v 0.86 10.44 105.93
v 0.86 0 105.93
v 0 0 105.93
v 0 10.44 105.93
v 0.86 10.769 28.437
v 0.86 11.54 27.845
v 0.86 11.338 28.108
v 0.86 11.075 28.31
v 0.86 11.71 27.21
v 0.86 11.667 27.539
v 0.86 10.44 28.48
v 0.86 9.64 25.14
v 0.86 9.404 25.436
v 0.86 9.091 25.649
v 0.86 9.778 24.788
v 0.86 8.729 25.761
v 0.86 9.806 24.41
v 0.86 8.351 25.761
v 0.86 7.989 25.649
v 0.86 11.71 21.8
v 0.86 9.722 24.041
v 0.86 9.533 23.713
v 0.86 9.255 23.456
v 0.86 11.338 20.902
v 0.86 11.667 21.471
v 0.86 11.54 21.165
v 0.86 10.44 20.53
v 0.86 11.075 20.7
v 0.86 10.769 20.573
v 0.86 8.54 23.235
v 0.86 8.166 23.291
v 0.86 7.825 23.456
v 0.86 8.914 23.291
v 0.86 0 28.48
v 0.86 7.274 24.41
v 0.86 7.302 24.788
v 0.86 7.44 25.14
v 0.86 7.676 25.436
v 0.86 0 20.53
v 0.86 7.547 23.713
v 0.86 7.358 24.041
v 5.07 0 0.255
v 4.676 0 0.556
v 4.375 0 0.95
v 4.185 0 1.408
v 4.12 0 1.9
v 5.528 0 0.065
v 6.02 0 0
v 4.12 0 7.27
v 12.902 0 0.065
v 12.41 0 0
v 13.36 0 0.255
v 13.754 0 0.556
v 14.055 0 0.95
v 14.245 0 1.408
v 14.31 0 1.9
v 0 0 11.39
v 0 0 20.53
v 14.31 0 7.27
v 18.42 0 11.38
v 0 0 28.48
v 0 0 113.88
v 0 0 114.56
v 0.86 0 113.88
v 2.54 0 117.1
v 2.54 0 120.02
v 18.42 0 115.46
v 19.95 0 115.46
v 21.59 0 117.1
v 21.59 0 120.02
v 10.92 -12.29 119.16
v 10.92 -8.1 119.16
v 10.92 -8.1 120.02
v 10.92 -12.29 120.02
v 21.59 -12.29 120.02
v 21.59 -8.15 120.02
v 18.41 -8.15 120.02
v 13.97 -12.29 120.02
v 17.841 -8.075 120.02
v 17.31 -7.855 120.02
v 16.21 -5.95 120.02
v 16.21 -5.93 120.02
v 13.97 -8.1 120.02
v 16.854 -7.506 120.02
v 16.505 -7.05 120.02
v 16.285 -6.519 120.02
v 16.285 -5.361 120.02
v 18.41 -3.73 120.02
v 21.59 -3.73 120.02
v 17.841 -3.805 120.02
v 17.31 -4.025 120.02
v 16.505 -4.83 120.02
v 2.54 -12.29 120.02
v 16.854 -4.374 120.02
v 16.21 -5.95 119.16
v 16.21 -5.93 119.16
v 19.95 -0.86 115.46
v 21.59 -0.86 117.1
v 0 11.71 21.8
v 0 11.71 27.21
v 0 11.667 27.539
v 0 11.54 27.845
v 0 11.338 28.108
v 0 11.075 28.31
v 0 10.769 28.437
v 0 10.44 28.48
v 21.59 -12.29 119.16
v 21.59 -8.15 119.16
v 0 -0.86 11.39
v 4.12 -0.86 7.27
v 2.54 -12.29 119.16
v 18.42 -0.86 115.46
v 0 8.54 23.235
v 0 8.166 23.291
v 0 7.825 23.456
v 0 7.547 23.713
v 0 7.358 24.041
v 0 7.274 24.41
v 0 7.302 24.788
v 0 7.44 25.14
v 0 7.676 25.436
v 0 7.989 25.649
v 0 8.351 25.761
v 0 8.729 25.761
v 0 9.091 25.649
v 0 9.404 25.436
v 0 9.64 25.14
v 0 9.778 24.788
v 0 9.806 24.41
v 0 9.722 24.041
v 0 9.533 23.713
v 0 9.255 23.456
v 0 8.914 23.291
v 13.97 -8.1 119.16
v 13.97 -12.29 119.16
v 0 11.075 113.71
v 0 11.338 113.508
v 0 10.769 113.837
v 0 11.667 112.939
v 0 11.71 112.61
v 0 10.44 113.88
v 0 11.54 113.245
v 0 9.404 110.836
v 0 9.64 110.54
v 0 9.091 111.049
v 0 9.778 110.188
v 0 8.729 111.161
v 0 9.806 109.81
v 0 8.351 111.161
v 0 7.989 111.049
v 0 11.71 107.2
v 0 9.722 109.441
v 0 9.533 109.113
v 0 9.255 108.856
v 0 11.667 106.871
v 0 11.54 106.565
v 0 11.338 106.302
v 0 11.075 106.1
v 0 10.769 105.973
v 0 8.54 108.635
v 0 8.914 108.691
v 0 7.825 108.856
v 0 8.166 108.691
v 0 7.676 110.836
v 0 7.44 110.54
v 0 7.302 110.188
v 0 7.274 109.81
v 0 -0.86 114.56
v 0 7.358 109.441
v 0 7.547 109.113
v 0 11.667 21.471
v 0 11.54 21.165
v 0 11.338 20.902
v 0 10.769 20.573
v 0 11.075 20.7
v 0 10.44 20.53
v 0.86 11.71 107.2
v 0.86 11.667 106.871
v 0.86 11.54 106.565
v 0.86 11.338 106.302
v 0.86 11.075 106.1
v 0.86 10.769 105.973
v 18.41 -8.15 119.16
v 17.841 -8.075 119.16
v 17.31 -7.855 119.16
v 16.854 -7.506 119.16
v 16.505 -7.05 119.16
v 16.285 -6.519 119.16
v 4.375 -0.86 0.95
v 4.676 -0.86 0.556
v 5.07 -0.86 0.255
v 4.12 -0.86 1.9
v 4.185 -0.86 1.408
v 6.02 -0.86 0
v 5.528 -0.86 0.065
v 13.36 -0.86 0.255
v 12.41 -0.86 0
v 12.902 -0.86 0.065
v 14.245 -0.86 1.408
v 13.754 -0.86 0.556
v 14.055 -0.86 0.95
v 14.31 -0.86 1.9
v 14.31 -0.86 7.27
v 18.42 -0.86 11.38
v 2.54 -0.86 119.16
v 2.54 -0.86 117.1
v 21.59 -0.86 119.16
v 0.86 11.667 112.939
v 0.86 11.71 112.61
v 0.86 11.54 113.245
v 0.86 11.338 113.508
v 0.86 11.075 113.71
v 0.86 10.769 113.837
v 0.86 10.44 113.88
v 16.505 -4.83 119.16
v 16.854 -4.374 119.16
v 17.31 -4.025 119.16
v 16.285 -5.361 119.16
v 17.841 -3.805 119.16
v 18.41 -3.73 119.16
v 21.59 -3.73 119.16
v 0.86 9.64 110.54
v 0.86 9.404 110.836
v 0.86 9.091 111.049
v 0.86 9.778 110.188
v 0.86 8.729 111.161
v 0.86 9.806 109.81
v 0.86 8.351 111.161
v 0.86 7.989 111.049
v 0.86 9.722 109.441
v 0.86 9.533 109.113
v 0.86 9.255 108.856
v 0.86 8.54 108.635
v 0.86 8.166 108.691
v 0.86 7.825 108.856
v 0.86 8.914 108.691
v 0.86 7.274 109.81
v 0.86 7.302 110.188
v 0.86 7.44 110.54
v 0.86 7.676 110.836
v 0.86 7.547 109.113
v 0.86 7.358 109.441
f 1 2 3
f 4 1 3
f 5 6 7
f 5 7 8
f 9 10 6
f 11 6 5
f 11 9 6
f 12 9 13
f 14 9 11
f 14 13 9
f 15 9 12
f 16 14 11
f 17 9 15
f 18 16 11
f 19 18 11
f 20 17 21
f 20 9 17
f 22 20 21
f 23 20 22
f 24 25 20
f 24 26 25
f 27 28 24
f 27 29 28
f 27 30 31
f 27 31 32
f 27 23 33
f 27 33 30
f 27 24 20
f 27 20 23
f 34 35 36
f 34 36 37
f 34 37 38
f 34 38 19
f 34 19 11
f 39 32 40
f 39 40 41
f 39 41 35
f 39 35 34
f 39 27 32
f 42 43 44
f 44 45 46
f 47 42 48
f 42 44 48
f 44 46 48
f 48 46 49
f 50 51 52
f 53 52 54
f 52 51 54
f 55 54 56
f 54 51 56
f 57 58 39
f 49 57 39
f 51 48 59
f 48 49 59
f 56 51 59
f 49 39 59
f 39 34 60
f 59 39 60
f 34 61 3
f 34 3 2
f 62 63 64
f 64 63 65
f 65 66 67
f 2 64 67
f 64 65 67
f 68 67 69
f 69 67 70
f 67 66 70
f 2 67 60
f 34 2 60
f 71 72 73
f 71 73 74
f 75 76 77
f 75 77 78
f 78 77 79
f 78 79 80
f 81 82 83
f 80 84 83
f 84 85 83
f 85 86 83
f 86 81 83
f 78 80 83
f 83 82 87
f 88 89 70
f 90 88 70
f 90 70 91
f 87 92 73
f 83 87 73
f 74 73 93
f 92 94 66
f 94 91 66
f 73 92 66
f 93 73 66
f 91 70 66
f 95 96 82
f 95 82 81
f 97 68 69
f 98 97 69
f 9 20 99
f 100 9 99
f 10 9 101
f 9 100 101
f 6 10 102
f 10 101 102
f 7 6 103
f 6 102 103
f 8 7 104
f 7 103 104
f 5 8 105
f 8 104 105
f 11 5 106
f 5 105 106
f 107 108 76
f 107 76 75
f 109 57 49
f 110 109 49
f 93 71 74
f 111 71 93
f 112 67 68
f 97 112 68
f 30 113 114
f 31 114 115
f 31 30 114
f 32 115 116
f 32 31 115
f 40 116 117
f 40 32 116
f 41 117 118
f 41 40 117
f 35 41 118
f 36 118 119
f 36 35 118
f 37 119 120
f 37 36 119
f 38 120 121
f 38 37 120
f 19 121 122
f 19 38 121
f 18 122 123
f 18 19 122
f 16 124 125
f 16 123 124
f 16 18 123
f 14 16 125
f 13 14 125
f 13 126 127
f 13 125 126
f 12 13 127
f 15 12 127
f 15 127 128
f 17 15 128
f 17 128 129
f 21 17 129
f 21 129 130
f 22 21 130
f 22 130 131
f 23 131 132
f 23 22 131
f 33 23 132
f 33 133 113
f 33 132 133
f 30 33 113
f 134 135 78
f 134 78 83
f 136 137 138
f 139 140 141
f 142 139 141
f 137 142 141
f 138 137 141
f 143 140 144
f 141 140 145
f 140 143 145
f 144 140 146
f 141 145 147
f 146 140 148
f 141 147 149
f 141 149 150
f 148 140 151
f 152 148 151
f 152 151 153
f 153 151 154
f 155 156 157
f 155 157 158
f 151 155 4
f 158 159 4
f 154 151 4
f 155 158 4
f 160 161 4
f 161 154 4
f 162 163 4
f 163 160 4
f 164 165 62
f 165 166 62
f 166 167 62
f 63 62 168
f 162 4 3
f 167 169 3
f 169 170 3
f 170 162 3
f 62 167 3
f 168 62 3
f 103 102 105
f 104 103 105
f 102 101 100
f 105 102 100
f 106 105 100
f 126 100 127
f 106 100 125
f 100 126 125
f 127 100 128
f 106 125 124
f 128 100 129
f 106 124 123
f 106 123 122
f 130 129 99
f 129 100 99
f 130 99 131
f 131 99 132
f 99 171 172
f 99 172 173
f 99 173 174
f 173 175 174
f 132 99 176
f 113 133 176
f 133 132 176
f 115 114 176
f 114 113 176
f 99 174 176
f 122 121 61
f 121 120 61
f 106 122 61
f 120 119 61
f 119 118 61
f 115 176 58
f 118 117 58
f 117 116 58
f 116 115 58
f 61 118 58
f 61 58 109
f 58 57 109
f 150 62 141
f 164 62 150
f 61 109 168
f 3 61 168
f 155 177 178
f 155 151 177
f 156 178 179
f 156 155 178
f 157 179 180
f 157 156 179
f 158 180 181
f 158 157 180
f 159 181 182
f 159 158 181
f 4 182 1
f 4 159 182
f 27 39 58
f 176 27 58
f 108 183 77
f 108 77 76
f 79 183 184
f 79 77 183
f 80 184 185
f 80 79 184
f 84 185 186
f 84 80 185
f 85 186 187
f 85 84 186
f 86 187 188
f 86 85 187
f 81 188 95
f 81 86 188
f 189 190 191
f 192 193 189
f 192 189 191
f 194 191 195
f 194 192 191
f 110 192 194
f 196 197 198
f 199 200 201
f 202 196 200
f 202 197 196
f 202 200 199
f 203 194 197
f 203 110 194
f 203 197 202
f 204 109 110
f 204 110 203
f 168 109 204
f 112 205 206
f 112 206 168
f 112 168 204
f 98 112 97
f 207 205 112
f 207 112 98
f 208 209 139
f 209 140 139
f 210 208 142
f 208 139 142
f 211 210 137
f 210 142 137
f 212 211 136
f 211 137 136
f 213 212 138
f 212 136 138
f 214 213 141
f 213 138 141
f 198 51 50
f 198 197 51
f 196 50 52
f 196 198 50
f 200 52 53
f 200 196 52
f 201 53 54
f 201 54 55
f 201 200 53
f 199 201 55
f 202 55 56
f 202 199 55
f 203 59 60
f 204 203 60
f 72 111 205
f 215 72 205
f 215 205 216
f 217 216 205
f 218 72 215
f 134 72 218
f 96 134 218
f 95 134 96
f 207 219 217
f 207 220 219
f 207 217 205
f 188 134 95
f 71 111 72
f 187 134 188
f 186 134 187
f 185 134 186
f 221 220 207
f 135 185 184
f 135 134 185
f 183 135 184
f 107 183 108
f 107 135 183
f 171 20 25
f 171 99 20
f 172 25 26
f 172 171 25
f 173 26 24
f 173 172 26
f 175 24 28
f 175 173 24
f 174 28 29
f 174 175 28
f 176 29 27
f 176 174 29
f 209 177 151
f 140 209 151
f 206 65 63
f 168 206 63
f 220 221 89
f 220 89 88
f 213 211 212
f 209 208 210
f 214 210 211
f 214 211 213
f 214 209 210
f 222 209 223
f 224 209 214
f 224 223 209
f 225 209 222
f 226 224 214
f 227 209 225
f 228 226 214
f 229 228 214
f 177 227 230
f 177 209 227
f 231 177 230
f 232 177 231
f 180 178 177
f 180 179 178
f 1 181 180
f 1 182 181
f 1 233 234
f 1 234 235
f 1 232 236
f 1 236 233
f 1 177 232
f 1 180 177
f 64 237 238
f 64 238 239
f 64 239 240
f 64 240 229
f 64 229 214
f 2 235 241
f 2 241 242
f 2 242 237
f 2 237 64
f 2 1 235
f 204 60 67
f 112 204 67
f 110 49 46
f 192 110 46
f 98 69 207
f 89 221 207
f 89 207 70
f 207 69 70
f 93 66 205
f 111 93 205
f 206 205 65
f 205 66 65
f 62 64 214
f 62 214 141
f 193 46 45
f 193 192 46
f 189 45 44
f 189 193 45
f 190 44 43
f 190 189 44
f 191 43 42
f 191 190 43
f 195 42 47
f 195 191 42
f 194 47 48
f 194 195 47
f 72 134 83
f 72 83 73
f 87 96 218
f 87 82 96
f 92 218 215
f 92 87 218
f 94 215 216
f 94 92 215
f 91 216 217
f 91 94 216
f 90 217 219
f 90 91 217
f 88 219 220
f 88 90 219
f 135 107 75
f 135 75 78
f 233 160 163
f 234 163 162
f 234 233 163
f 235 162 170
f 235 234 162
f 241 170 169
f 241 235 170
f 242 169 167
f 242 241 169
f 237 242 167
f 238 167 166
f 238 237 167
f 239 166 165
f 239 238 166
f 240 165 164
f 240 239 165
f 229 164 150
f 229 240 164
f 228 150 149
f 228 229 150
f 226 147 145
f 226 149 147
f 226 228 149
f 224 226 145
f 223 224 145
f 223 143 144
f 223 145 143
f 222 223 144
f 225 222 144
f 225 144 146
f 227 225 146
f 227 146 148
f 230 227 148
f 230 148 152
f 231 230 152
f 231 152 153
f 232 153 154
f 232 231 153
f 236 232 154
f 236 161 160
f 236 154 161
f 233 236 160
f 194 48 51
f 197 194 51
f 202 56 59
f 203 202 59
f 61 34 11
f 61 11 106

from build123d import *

# Parameters (mm, degrees)
PAD_DEPTH                 = 0.86
PAD002_DEPTH              = 0.86
FILLET_R                  = 2.2
FILLET001_R               = 1.9
CYLINDER_R                = 1.27
CYLINDER_DEPTH            = 10
BOX_W                     = 0.86
BOX_H                     = 12.57
BOX_DEPTH                 = 7.95
FILLET002_R               = 1.27
FILLET002_PLACEMENT_ANGLE = 180
CYLINDER001_R             = 1.27
CYLINDER001_DEPTH         = 10
BOX001_W                  = 0.86
BOX001_H                  = 12.57
BOX001_DEPTH              = 7.95
FILLET003_R               = 1.27
FILLET003_PLACEMENT_ANGLE = 180


with BuildPart() as body:
    # Sketch → Pad (new body)
    with BuildSketch(Plane.XZ):
        Polygon((0, 11.39), (4.12, 7.27), (4.12, 0), (14.31, 0), (14.31, 7.27), (18.42, 11.38), (18.42, 115.46), (19.95, 115.46), (21.59, 117.1), (21.59, 120.02), (2.54, 120.02), (2.54, 117.1), (0, 114.56), align=None)
    extrude(amount=PAD_DEPTH)


with BuildPart() as fillet001:
    # Sketch002 (on Face10 of Pad) → Pad002 (new body)
    with BuildSketch(Plane(origin=(0, 0, 120.02), x_dir=(-1, 0, 0), z_dir=(0, 0, 1))):
        Polygon((-21.59, 0.86), (-21.59, 3.73), (-16.21, 3.73), (-16.21, 8.15), (-21.59, 8.15), (-21.59, 12.29), (-13.97, 12.29), (-13.97, 8.1), (-10.92, 8.1), (-10.92, 12.29), (-2.54, 12.29), (-2.54, 0.86), align=None)
    extrude(amount=PAD002_DEPTH)


with BuildPart() as fillet001_1:
    # Body001 placement: moved
    add(fillet001.part.moved(Location((0, 0, -0.86))))

    # Fusion: union Body
    add(body.part)

    # Fillet
    fillet_edges = [fillet001_1.edges().sort_by_distance(p)[0] for p in [
        (16.21, -3.73, 119.59),
        (16.21, -8.15, 119.59),
    ]]
    fillet(fillet_edges, radius=FILLET_R)

    # Fillet001
    fillet001_edges = [fillet001_1.edges().sort_by_distance(p)[0] for p in [
        (4.12, -0.43, 0),
        (14.31, -0.43, 0),
    ]]
    fillet(fillet001_edges, radius=FILLET001_R)


with BuildPart() as cylinder:
    # Cylinder → Cylinder (new body)
    with BuildSketch(Plane(origin=(0, -9.4, 3.975), x_dir=(0, 0, -1), z_dir=(1, 0, 0))):
        Circle(CYLINDER_R)
    extrude(amount=CYLINDER_DEPTH)


with BuildPart() as fillet002:
    # Box → Box (new body)
    with BuildSketch(Plane(origin=(0, -12.57, 0), x_dir=(1, 0, 0), z_dir=(0, 0, 1))):
        with Locations((0.43, 6.285)):
            Rectangle(BOX_W, BOX_H)
    extrude(amount=BOX_DEPTH)

    # Cut: cut Cylinder
    add(cylinder.part, mode=Mode.SUBTRACT)

    # Fillet002
    fillet002_edges = [fillet002.edges().sort_by_distance(p)[0] for p in [
        (0.43, -12.57, 0),
        (0.43, -12.57, 7.95),
    ]]
    fillet(fillet002_edges, radius=FILLET002_R)


with BuildPart() as fillet002_1:
    # Fillet002 placement: moved
    add(fillet002.part.moved(Location((0.86, -0.86, 105.93))).rotate(Axis((0.86, -0.86, 105.93), (0, 0, 1)), FILLET002_PLACEMENT_ANGLE))


with BuildPart() as cylinder001:
    # Cylinder001 → Cylinder001 (new body)
    with BuildSketch(Plane(origin=(0, -9.4, 3.975), x_dir=(0, 0, -1), z_dir=(1, 0, 0))):
        Circle(CYLINDER001_R)
    extrude(amount=CYLINDER001_DEPTH)


with BuildPart() as iobracket_standard:
    # Box001 → Box001 (new body)
    with BuildSketch(Plane(origin=(0, -12.57, 0), x_dir=(1, 0, 0), z_dir=(0, 0, 1))):
        with Locations((0.43, 6.285)):
            Rectangle(BOX001_W, BOX001_H)
    extrude(amount=BOX001_DEPTH)

    # Cut001: cut Cylinder001
    add(cylinder001.part, mode=Mode.SUBTRACT)

    # Fillet003
    fillet003_edges = [iobracket_standard.edges().sort_by_distance(p)[0] for p in [
        (0.43, -12.57, 0),
        (0.43, -12.57, 7.95),
    ]]
    fillet(fillet003_edges, radius=FILLET003_R)


with BuildPart() as iobracket_standard_1:
    # Fillet003 placement: moved
    add(iobracket_standard.part.moved(Location((0.86, -0.86, 20.53))).rotate(Axis((0.86, -0.86, 20.53), (0, 0, 1)), FILLET003_PLACEMENT_ANGLE))

    # Fusion001: union Fillet001, Fillet002
    add(fillet001_1.part)
    add(fillet002_1.part)


solid = iobracket_standard_1.part
